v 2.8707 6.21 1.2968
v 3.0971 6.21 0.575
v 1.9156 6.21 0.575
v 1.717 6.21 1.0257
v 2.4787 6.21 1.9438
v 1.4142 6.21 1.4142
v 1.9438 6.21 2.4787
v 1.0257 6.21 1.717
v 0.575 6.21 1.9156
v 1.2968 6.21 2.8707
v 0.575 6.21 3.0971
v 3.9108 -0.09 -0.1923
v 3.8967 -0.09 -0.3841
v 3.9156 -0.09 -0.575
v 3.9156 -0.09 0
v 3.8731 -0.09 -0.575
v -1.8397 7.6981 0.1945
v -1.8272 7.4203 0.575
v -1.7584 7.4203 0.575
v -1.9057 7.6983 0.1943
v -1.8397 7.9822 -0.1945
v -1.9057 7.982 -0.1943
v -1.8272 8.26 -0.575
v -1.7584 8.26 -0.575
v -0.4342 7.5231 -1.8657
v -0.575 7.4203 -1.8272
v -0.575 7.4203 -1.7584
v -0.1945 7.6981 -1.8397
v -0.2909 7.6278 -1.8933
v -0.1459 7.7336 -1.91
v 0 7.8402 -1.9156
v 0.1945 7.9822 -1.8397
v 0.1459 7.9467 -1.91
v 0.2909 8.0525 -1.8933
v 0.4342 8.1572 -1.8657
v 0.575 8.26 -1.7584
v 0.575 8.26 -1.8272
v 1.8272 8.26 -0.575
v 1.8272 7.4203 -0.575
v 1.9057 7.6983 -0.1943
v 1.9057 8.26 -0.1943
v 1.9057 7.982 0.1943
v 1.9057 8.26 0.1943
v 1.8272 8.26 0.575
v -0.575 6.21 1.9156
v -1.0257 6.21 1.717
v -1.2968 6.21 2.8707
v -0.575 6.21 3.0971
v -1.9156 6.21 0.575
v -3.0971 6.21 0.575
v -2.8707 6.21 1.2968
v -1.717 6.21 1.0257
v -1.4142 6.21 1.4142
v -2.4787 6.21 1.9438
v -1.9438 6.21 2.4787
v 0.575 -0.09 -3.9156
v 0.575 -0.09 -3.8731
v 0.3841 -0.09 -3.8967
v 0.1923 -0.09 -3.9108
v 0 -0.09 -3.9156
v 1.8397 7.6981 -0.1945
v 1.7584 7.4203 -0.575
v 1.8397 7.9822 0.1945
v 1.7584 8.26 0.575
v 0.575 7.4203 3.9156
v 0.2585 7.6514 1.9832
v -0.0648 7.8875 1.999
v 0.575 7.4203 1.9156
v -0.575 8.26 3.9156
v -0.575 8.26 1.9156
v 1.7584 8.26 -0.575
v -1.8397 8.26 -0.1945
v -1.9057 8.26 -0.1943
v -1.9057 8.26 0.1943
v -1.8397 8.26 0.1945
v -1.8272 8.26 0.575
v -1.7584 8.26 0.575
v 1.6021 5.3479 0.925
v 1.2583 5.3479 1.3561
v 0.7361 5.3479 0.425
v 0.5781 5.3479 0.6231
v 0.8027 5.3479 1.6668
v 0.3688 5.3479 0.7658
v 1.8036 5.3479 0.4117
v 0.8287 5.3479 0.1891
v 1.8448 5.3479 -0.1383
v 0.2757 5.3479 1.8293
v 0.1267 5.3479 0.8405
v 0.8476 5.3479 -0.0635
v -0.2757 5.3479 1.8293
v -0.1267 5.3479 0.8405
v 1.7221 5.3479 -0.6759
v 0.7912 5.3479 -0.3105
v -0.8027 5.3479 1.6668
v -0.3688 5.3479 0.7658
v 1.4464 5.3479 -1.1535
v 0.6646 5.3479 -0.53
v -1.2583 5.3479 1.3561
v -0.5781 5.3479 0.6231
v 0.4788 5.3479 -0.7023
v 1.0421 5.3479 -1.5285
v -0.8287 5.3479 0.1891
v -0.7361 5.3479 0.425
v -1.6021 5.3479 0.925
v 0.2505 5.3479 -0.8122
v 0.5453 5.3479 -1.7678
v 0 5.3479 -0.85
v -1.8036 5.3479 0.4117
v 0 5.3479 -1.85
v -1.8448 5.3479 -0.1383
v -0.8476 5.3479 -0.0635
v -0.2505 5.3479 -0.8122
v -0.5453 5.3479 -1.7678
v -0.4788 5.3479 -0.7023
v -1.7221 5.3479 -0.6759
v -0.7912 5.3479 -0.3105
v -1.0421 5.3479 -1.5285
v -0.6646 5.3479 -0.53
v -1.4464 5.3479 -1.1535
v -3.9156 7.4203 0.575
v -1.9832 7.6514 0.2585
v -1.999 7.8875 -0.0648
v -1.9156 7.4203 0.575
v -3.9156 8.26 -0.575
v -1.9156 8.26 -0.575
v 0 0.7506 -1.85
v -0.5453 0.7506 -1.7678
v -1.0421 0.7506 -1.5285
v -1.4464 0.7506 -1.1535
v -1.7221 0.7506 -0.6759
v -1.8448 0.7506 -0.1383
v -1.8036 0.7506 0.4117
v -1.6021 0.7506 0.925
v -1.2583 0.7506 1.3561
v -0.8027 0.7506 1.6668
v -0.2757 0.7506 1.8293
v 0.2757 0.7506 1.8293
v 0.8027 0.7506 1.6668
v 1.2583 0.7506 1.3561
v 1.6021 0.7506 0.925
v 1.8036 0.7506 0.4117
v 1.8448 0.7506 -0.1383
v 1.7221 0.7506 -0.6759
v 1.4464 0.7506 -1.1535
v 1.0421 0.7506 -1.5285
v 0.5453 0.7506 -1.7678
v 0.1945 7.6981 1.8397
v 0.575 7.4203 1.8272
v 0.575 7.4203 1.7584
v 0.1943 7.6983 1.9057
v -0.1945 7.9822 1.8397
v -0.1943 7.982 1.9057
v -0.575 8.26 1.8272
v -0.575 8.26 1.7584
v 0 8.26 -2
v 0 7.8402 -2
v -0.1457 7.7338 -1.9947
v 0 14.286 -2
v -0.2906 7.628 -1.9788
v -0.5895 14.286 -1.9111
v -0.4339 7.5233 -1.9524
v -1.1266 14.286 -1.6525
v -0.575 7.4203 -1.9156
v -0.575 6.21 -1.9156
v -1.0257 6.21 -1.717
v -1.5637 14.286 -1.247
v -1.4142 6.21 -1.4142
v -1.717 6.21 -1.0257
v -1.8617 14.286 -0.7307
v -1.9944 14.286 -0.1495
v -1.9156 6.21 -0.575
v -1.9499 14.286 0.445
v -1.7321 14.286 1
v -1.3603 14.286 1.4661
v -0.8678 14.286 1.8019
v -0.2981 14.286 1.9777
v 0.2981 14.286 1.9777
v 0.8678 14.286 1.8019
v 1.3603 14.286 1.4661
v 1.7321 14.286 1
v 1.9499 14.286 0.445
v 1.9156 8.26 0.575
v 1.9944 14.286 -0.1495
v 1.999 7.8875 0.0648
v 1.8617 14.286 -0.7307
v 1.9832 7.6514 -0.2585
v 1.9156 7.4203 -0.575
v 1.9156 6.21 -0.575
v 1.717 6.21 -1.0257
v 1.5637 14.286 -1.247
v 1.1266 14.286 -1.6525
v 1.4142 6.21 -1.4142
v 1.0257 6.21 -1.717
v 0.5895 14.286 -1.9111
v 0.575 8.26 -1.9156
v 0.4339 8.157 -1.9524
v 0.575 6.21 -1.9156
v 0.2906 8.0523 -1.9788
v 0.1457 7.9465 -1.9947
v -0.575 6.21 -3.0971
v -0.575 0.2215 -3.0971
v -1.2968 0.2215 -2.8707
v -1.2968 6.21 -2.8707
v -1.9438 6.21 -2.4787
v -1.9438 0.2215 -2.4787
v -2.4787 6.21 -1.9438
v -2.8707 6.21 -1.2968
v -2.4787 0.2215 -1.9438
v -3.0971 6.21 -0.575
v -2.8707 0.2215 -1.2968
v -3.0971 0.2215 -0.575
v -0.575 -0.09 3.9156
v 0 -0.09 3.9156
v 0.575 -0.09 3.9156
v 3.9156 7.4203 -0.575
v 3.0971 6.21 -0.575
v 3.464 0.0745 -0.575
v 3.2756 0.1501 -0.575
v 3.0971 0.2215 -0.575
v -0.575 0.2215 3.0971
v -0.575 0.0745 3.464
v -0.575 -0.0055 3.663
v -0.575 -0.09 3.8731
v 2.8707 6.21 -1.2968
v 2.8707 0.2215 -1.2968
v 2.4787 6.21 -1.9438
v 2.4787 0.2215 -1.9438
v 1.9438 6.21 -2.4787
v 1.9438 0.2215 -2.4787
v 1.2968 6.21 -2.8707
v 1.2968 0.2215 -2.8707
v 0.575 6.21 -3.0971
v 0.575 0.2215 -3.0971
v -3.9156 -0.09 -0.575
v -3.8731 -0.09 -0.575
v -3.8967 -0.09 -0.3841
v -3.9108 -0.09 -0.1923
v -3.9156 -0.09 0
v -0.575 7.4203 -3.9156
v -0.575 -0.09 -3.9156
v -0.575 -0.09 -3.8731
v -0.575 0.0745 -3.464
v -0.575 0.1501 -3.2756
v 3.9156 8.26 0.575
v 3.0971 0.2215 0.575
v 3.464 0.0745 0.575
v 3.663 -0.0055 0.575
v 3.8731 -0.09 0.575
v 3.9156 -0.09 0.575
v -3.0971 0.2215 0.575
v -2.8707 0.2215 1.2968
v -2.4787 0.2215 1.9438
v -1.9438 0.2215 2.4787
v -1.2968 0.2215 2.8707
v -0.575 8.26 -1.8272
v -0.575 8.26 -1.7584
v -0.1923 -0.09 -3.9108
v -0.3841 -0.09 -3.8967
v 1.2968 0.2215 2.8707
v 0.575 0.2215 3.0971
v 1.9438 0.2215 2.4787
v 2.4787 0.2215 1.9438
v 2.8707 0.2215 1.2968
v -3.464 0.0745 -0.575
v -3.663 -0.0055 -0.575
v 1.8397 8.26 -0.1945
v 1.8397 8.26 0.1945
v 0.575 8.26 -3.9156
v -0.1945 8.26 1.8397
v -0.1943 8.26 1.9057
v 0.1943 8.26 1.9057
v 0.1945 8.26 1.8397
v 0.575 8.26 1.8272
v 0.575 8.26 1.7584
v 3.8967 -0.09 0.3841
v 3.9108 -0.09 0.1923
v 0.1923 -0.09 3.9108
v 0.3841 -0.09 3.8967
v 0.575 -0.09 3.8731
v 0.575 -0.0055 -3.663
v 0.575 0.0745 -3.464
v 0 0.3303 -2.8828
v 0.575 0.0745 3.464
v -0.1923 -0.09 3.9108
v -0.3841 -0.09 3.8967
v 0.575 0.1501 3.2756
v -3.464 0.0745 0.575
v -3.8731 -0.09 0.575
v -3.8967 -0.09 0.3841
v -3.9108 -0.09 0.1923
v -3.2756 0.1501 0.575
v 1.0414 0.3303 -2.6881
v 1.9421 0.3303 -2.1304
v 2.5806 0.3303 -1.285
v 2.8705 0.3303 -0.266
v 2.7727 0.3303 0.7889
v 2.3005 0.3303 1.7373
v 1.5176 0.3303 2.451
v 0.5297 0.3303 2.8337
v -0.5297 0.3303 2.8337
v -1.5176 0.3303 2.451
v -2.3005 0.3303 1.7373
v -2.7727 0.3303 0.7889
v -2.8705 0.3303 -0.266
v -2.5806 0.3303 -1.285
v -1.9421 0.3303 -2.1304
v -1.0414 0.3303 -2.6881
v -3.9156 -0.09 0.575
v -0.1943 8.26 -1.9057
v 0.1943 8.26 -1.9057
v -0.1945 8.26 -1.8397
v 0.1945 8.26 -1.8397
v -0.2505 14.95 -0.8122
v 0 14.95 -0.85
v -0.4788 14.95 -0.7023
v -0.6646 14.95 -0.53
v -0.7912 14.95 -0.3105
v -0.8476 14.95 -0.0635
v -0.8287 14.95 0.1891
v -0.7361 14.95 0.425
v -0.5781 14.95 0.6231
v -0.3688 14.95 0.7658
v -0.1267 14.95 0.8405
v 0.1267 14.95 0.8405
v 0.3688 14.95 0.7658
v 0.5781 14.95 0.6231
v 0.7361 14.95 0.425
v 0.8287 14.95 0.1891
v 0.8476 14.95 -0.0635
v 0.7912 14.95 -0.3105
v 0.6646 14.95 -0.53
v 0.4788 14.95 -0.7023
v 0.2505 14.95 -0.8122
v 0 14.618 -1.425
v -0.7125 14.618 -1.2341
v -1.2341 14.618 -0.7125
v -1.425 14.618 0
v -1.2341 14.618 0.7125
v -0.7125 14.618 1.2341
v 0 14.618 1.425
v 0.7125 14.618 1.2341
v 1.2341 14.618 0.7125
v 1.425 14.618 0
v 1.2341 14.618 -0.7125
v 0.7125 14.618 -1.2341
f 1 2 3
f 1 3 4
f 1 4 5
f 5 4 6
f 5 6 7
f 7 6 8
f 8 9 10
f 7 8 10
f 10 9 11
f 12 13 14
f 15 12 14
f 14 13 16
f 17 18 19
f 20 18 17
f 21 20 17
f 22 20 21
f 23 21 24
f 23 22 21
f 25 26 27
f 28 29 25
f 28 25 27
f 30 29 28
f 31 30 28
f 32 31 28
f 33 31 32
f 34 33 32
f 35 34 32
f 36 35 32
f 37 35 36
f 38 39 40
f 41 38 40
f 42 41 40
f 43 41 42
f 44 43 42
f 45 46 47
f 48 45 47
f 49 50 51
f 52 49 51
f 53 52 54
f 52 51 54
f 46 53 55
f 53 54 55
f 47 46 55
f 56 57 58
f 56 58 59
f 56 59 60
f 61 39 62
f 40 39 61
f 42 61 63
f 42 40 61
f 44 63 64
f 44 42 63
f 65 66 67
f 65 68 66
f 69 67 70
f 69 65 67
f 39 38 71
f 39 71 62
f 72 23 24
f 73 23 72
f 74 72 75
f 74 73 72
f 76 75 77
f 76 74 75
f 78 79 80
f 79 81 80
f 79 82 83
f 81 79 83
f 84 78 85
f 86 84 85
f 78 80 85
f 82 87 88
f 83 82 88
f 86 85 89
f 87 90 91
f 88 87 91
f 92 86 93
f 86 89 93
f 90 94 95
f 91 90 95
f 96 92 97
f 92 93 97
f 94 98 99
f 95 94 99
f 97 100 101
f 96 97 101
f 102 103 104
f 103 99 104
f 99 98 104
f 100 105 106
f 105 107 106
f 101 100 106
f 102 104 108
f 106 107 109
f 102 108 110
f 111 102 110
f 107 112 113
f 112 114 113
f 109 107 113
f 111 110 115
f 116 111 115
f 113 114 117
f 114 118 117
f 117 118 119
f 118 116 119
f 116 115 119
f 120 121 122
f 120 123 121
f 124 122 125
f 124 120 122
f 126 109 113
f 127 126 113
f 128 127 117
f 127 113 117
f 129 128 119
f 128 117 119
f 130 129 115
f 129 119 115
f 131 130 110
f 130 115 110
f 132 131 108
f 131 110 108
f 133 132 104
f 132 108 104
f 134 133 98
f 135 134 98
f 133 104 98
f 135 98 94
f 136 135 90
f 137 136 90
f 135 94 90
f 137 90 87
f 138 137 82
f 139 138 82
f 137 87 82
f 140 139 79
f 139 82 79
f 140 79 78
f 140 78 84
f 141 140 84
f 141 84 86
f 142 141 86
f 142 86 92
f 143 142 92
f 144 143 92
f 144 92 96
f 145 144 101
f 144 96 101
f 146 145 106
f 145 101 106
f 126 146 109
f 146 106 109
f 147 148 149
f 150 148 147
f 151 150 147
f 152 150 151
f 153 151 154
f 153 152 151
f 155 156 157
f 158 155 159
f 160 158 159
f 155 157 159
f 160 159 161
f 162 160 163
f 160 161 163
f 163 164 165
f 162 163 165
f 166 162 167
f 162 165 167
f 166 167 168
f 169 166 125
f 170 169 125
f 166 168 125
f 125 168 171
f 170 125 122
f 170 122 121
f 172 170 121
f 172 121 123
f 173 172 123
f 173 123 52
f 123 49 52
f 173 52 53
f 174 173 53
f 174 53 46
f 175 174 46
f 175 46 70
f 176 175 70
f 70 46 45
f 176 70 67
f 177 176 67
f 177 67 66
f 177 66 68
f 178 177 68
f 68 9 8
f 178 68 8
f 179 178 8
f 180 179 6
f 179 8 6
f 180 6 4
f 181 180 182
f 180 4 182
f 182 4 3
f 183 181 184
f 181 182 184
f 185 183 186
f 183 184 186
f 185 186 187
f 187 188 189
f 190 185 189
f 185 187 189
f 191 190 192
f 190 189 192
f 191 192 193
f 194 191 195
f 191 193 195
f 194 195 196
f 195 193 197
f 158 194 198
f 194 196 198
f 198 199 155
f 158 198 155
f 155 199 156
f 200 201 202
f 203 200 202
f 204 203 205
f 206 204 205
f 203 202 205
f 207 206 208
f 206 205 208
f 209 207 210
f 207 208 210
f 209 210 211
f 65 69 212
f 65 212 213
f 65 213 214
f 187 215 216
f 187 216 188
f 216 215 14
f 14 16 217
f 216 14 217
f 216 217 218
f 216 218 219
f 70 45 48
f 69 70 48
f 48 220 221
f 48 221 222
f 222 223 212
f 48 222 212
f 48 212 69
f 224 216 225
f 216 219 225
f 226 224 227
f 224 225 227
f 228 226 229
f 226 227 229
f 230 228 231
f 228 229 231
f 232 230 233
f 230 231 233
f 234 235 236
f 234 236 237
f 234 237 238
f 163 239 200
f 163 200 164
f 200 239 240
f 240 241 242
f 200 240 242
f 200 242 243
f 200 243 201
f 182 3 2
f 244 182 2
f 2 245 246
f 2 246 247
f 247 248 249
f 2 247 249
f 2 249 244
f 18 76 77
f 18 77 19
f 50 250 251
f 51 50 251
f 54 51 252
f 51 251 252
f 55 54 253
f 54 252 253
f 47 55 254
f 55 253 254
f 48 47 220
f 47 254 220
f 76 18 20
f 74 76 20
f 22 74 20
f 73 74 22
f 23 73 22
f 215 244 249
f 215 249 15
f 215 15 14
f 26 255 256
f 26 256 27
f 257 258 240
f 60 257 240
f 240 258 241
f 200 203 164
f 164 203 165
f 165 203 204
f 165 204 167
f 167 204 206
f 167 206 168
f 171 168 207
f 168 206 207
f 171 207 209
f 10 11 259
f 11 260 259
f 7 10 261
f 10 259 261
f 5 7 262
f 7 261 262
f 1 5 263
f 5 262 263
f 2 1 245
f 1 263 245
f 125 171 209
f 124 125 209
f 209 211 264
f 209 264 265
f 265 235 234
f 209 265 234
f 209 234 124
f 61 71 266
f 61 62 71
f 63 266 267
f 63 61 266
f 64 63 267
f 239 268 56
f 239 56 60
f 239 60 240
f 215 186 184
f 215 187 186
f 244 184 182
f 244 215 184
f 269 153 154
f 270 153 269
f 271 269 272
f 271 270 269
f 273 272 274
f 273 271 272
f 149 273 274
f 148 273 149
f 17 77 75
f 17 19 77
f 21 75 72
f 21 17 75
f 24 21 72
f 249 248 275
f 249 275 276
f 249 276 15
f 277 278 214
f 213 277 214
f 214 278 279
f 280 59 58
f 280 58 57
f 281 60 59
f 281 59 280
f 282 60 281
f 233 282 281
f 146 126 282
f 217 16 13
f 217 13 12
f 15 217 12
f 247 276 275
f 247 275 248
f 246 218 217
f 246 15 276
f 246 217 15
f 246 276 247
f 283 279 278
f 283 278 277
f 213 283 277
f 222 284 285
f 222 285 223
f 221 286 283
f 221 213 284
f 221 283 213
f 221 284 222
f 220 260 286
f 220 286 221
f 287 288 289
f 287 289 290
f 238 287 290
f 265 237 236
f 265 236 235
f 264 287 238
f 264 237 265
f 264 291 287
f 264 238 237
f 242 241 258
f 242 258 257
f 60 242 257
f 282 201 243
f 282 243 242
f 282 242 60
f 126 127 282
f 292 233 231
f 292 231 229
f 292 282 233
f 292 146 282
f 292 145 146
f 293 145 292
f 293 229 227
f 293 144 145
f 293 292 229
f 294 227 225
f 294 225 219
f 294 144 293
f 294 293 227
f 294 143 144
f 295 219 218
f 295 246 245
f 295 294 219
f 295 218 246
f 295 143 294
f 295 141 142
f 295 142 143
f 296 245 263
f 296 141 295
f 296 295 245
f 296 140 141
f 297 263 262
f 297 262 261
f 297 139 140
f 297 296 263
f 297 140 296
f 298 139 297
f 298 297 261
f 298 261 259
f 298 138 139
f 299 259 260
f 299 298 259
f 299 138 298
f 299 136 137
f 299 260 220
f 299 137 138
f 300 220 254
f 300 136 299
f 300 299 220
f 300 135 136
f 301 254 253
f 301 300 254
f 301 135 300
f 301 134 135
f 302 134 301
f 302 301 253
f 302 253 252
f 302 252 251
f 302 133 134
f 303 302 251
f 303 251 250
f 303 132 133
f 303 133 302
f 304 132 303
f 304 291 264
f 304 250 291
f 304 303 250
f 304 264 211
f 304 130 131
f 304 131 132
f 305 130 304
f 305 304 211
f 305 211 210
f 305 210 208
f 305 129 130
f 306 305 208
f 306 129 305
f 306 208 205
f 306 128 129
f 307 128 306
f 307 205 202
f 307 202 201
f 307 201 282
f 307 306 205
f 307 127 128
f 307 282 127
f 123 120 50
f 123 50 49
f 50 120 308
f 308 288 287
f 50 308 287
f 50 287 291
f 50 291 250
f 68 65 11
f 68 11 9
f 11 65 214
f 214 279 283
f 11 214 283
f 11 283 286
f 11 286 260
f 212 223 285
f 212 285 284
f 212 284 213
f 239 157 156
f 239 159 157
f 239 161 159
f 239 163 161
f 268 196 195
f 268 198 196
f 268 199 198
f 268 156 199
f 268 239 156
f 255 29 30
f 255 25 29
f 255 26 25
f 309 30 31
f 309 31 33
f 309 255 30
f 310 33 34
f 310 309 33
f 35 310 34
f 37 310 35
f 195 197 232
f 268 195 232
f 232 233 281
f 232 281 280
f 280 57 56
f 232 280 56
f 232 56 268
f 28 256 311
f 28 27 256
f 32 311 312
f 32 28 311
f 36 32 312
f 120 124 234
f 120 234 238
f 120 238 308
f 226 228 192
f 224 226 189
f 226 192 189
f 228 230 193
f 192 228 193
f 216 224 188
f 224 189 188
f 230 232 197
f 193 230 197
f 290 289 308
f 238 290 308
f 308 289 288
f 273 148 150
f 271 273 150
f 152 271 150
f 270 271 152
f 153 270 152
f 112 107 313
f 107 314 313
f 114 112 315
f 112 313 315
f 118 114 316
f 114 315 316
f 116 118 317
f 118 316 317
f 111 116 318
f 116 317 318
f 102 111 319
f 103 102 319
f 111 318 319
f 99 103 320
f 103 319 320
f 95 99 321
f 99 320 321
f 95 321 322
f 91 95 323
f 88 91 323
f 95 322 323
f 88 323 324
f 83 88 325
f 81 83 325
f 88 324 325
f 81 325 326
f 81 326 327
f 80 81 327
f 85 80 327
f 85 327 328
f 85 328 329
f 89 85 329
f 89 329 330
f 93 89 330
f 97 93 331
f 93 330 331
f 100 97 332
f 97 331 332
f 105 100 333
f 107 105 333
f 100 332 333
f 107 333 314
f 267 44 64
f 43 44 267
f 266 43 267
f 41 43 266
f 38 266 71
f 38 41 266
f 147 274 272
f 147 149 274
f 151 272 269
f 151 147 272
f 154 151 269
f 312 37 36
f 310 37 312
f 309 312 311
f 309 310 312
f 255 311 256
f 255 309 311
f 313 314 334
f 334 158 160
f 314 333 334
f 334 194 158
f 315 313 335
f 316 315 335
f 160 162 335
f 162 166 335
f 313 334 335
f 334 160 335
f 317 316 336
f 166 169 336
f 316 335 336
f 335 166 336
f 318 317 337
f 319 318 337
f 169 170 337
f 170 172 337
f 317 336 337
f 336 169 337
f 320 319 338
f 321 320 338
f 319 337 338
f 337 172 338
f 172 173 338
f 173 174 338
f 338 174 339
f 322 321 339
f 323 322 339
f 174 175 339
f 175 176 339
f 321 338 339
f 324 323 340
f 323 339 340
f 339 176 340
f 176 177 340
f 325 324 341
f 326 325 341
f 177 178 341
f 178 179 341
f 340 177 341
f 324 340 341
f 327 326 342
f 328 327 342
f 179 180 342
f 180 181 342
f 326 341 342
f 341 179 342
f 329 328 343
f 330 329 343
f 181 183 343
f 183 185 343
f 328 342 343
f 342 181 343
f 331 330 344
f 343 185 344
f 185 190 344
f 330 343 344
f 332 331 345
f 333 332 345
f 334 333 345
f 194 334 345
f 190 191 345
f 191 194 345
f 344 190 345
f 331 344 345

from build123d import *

# Parameters (mm, degrees)
BOSS_EXTRUDE1_START     = -6.3
BOSS_EXTRUDE1_DEPTH     = 8.35
CUT_EXTRUDE1_REACH      = 18.833
CUT_EXTRUDE1_END_RADIUS = 1.85
CIRPATTERN3_COUNT       = 4
SKETCH10_W              = 0.084438725
SKETCH10_H              = 2.05


with BuildPart() as part:
    # Sketch1 → Revolve1 (revolve)
    with BuildSketch(Plane.XY):
        Polygon((-3.15, 0), (-1.85, 0.75055535), (-1.85, 5.347868077), (-0.85, 5.347868077), (-0.85, 14.95), (-2, 14.28604719), (-2, 6.21), (-3.15, 6.21), align=None)
    revolve(axis=Axis((0, 0, 0), (0, 1, 0)))

    # Sketch3 → Boss-Extrude1 (add)
    with BuildSketch(Plane(origin=(0, 6.21, 0), x_dir=(1, 0, 0), z_dir=(0, 1, 0)).offset(BOSS_EXTRUDE1_START)):
        with BuildLine():
            Line((-0.575, -3.915561275), (0.575, -3.915561275))
            Line((0.575, -3.915561275), (0.575, -1.915561275))
            ThreePointArc((0.575, -1.915561275), (0, -2), (-0.575, -1.915561275))
            Line((-0.575, -1.915561275), (-0.575, -3.915561275))
        make_face()
    boss_extrude1 = extrude(amount=BOSS_EXTRUDE1_DEPTH)

    # Cut-Extrude1: up to this cylinder (the profile starts outside it)
    cut_extrude1_end = Plane(origin=(0, 7.980101, 0), z_dir=(0, -1, 0)) * Cylinder(CUT_EXTRUDE1_END_RADIUS, 42.366, mode=Mode.PRIVATE)
    # Sketch4 → Cut-Extrude1 (cut, up to the surface)
    with BuildSketch(Plane.XY.offset(3.915561275), mode=Mode.PRIVATE) as cut_extrude1_sk1:
        Polygon((0.575, 7.420304493), (-0.575, 8.26), (0.575, 8.26), align=None)
    cut_extrude1_tool1 = extrude(cut_extrude1_sk1.sketch, amount=-CUT_EXTRUDE1_REACH, mode=Mode.PRIVATE) - cut_extrude1_end
    cut_extrude1 = cut_extrude1_tool1.solids().sort_by_distance((0.191667, 7.980101, 3.915561))[0]
    add(cut_extrude1, mode=Mode.SUBTRACT)

    # CirPattern3: Boss-Extrude1, Cut-Extrude1 ×4 about axis
    cirpattern3_axis = Axis((0, 14.28604719, 0), (0, -1, 0))
    add([boss_extrude1.rotate(cirpattern3_axis, i * 360 / CIRPATTERN3_COUNT) for i in range(1, CIRPATTERN3_COUNT)])
    add([cut_extrude1.rotate(cirpattern3_axis, i * 360 / CIRPATTERN3_COUNT) for i in range(1, CIRPATTERN3_COUNT)], mode=Mode.SUBTRACT)

    # Sketch9 → Cut-Revolve2 (revolve, cut)
    with BuildSketch(Plane.XY):
        Polygon((-3.915561275, -0.09), (-1.85, 0.75055535), (-1.85, -0.09), align=None)
    revolve(axis=Axis((0, 0, 0), (0, -1, 0)), mode=Mode.SUBTRACT)

    # Sketch10 → Revolve2 (revolve)
    with BuildSketch(Plane.XY):
        with Locations((-1.957780637, 7.235)):
            Rectangle(SKETCH10_W, SKETCH10_H)
    revolve(axis=Axis((0, 0, 0), (0, -1, 0)))


solid = part.part
